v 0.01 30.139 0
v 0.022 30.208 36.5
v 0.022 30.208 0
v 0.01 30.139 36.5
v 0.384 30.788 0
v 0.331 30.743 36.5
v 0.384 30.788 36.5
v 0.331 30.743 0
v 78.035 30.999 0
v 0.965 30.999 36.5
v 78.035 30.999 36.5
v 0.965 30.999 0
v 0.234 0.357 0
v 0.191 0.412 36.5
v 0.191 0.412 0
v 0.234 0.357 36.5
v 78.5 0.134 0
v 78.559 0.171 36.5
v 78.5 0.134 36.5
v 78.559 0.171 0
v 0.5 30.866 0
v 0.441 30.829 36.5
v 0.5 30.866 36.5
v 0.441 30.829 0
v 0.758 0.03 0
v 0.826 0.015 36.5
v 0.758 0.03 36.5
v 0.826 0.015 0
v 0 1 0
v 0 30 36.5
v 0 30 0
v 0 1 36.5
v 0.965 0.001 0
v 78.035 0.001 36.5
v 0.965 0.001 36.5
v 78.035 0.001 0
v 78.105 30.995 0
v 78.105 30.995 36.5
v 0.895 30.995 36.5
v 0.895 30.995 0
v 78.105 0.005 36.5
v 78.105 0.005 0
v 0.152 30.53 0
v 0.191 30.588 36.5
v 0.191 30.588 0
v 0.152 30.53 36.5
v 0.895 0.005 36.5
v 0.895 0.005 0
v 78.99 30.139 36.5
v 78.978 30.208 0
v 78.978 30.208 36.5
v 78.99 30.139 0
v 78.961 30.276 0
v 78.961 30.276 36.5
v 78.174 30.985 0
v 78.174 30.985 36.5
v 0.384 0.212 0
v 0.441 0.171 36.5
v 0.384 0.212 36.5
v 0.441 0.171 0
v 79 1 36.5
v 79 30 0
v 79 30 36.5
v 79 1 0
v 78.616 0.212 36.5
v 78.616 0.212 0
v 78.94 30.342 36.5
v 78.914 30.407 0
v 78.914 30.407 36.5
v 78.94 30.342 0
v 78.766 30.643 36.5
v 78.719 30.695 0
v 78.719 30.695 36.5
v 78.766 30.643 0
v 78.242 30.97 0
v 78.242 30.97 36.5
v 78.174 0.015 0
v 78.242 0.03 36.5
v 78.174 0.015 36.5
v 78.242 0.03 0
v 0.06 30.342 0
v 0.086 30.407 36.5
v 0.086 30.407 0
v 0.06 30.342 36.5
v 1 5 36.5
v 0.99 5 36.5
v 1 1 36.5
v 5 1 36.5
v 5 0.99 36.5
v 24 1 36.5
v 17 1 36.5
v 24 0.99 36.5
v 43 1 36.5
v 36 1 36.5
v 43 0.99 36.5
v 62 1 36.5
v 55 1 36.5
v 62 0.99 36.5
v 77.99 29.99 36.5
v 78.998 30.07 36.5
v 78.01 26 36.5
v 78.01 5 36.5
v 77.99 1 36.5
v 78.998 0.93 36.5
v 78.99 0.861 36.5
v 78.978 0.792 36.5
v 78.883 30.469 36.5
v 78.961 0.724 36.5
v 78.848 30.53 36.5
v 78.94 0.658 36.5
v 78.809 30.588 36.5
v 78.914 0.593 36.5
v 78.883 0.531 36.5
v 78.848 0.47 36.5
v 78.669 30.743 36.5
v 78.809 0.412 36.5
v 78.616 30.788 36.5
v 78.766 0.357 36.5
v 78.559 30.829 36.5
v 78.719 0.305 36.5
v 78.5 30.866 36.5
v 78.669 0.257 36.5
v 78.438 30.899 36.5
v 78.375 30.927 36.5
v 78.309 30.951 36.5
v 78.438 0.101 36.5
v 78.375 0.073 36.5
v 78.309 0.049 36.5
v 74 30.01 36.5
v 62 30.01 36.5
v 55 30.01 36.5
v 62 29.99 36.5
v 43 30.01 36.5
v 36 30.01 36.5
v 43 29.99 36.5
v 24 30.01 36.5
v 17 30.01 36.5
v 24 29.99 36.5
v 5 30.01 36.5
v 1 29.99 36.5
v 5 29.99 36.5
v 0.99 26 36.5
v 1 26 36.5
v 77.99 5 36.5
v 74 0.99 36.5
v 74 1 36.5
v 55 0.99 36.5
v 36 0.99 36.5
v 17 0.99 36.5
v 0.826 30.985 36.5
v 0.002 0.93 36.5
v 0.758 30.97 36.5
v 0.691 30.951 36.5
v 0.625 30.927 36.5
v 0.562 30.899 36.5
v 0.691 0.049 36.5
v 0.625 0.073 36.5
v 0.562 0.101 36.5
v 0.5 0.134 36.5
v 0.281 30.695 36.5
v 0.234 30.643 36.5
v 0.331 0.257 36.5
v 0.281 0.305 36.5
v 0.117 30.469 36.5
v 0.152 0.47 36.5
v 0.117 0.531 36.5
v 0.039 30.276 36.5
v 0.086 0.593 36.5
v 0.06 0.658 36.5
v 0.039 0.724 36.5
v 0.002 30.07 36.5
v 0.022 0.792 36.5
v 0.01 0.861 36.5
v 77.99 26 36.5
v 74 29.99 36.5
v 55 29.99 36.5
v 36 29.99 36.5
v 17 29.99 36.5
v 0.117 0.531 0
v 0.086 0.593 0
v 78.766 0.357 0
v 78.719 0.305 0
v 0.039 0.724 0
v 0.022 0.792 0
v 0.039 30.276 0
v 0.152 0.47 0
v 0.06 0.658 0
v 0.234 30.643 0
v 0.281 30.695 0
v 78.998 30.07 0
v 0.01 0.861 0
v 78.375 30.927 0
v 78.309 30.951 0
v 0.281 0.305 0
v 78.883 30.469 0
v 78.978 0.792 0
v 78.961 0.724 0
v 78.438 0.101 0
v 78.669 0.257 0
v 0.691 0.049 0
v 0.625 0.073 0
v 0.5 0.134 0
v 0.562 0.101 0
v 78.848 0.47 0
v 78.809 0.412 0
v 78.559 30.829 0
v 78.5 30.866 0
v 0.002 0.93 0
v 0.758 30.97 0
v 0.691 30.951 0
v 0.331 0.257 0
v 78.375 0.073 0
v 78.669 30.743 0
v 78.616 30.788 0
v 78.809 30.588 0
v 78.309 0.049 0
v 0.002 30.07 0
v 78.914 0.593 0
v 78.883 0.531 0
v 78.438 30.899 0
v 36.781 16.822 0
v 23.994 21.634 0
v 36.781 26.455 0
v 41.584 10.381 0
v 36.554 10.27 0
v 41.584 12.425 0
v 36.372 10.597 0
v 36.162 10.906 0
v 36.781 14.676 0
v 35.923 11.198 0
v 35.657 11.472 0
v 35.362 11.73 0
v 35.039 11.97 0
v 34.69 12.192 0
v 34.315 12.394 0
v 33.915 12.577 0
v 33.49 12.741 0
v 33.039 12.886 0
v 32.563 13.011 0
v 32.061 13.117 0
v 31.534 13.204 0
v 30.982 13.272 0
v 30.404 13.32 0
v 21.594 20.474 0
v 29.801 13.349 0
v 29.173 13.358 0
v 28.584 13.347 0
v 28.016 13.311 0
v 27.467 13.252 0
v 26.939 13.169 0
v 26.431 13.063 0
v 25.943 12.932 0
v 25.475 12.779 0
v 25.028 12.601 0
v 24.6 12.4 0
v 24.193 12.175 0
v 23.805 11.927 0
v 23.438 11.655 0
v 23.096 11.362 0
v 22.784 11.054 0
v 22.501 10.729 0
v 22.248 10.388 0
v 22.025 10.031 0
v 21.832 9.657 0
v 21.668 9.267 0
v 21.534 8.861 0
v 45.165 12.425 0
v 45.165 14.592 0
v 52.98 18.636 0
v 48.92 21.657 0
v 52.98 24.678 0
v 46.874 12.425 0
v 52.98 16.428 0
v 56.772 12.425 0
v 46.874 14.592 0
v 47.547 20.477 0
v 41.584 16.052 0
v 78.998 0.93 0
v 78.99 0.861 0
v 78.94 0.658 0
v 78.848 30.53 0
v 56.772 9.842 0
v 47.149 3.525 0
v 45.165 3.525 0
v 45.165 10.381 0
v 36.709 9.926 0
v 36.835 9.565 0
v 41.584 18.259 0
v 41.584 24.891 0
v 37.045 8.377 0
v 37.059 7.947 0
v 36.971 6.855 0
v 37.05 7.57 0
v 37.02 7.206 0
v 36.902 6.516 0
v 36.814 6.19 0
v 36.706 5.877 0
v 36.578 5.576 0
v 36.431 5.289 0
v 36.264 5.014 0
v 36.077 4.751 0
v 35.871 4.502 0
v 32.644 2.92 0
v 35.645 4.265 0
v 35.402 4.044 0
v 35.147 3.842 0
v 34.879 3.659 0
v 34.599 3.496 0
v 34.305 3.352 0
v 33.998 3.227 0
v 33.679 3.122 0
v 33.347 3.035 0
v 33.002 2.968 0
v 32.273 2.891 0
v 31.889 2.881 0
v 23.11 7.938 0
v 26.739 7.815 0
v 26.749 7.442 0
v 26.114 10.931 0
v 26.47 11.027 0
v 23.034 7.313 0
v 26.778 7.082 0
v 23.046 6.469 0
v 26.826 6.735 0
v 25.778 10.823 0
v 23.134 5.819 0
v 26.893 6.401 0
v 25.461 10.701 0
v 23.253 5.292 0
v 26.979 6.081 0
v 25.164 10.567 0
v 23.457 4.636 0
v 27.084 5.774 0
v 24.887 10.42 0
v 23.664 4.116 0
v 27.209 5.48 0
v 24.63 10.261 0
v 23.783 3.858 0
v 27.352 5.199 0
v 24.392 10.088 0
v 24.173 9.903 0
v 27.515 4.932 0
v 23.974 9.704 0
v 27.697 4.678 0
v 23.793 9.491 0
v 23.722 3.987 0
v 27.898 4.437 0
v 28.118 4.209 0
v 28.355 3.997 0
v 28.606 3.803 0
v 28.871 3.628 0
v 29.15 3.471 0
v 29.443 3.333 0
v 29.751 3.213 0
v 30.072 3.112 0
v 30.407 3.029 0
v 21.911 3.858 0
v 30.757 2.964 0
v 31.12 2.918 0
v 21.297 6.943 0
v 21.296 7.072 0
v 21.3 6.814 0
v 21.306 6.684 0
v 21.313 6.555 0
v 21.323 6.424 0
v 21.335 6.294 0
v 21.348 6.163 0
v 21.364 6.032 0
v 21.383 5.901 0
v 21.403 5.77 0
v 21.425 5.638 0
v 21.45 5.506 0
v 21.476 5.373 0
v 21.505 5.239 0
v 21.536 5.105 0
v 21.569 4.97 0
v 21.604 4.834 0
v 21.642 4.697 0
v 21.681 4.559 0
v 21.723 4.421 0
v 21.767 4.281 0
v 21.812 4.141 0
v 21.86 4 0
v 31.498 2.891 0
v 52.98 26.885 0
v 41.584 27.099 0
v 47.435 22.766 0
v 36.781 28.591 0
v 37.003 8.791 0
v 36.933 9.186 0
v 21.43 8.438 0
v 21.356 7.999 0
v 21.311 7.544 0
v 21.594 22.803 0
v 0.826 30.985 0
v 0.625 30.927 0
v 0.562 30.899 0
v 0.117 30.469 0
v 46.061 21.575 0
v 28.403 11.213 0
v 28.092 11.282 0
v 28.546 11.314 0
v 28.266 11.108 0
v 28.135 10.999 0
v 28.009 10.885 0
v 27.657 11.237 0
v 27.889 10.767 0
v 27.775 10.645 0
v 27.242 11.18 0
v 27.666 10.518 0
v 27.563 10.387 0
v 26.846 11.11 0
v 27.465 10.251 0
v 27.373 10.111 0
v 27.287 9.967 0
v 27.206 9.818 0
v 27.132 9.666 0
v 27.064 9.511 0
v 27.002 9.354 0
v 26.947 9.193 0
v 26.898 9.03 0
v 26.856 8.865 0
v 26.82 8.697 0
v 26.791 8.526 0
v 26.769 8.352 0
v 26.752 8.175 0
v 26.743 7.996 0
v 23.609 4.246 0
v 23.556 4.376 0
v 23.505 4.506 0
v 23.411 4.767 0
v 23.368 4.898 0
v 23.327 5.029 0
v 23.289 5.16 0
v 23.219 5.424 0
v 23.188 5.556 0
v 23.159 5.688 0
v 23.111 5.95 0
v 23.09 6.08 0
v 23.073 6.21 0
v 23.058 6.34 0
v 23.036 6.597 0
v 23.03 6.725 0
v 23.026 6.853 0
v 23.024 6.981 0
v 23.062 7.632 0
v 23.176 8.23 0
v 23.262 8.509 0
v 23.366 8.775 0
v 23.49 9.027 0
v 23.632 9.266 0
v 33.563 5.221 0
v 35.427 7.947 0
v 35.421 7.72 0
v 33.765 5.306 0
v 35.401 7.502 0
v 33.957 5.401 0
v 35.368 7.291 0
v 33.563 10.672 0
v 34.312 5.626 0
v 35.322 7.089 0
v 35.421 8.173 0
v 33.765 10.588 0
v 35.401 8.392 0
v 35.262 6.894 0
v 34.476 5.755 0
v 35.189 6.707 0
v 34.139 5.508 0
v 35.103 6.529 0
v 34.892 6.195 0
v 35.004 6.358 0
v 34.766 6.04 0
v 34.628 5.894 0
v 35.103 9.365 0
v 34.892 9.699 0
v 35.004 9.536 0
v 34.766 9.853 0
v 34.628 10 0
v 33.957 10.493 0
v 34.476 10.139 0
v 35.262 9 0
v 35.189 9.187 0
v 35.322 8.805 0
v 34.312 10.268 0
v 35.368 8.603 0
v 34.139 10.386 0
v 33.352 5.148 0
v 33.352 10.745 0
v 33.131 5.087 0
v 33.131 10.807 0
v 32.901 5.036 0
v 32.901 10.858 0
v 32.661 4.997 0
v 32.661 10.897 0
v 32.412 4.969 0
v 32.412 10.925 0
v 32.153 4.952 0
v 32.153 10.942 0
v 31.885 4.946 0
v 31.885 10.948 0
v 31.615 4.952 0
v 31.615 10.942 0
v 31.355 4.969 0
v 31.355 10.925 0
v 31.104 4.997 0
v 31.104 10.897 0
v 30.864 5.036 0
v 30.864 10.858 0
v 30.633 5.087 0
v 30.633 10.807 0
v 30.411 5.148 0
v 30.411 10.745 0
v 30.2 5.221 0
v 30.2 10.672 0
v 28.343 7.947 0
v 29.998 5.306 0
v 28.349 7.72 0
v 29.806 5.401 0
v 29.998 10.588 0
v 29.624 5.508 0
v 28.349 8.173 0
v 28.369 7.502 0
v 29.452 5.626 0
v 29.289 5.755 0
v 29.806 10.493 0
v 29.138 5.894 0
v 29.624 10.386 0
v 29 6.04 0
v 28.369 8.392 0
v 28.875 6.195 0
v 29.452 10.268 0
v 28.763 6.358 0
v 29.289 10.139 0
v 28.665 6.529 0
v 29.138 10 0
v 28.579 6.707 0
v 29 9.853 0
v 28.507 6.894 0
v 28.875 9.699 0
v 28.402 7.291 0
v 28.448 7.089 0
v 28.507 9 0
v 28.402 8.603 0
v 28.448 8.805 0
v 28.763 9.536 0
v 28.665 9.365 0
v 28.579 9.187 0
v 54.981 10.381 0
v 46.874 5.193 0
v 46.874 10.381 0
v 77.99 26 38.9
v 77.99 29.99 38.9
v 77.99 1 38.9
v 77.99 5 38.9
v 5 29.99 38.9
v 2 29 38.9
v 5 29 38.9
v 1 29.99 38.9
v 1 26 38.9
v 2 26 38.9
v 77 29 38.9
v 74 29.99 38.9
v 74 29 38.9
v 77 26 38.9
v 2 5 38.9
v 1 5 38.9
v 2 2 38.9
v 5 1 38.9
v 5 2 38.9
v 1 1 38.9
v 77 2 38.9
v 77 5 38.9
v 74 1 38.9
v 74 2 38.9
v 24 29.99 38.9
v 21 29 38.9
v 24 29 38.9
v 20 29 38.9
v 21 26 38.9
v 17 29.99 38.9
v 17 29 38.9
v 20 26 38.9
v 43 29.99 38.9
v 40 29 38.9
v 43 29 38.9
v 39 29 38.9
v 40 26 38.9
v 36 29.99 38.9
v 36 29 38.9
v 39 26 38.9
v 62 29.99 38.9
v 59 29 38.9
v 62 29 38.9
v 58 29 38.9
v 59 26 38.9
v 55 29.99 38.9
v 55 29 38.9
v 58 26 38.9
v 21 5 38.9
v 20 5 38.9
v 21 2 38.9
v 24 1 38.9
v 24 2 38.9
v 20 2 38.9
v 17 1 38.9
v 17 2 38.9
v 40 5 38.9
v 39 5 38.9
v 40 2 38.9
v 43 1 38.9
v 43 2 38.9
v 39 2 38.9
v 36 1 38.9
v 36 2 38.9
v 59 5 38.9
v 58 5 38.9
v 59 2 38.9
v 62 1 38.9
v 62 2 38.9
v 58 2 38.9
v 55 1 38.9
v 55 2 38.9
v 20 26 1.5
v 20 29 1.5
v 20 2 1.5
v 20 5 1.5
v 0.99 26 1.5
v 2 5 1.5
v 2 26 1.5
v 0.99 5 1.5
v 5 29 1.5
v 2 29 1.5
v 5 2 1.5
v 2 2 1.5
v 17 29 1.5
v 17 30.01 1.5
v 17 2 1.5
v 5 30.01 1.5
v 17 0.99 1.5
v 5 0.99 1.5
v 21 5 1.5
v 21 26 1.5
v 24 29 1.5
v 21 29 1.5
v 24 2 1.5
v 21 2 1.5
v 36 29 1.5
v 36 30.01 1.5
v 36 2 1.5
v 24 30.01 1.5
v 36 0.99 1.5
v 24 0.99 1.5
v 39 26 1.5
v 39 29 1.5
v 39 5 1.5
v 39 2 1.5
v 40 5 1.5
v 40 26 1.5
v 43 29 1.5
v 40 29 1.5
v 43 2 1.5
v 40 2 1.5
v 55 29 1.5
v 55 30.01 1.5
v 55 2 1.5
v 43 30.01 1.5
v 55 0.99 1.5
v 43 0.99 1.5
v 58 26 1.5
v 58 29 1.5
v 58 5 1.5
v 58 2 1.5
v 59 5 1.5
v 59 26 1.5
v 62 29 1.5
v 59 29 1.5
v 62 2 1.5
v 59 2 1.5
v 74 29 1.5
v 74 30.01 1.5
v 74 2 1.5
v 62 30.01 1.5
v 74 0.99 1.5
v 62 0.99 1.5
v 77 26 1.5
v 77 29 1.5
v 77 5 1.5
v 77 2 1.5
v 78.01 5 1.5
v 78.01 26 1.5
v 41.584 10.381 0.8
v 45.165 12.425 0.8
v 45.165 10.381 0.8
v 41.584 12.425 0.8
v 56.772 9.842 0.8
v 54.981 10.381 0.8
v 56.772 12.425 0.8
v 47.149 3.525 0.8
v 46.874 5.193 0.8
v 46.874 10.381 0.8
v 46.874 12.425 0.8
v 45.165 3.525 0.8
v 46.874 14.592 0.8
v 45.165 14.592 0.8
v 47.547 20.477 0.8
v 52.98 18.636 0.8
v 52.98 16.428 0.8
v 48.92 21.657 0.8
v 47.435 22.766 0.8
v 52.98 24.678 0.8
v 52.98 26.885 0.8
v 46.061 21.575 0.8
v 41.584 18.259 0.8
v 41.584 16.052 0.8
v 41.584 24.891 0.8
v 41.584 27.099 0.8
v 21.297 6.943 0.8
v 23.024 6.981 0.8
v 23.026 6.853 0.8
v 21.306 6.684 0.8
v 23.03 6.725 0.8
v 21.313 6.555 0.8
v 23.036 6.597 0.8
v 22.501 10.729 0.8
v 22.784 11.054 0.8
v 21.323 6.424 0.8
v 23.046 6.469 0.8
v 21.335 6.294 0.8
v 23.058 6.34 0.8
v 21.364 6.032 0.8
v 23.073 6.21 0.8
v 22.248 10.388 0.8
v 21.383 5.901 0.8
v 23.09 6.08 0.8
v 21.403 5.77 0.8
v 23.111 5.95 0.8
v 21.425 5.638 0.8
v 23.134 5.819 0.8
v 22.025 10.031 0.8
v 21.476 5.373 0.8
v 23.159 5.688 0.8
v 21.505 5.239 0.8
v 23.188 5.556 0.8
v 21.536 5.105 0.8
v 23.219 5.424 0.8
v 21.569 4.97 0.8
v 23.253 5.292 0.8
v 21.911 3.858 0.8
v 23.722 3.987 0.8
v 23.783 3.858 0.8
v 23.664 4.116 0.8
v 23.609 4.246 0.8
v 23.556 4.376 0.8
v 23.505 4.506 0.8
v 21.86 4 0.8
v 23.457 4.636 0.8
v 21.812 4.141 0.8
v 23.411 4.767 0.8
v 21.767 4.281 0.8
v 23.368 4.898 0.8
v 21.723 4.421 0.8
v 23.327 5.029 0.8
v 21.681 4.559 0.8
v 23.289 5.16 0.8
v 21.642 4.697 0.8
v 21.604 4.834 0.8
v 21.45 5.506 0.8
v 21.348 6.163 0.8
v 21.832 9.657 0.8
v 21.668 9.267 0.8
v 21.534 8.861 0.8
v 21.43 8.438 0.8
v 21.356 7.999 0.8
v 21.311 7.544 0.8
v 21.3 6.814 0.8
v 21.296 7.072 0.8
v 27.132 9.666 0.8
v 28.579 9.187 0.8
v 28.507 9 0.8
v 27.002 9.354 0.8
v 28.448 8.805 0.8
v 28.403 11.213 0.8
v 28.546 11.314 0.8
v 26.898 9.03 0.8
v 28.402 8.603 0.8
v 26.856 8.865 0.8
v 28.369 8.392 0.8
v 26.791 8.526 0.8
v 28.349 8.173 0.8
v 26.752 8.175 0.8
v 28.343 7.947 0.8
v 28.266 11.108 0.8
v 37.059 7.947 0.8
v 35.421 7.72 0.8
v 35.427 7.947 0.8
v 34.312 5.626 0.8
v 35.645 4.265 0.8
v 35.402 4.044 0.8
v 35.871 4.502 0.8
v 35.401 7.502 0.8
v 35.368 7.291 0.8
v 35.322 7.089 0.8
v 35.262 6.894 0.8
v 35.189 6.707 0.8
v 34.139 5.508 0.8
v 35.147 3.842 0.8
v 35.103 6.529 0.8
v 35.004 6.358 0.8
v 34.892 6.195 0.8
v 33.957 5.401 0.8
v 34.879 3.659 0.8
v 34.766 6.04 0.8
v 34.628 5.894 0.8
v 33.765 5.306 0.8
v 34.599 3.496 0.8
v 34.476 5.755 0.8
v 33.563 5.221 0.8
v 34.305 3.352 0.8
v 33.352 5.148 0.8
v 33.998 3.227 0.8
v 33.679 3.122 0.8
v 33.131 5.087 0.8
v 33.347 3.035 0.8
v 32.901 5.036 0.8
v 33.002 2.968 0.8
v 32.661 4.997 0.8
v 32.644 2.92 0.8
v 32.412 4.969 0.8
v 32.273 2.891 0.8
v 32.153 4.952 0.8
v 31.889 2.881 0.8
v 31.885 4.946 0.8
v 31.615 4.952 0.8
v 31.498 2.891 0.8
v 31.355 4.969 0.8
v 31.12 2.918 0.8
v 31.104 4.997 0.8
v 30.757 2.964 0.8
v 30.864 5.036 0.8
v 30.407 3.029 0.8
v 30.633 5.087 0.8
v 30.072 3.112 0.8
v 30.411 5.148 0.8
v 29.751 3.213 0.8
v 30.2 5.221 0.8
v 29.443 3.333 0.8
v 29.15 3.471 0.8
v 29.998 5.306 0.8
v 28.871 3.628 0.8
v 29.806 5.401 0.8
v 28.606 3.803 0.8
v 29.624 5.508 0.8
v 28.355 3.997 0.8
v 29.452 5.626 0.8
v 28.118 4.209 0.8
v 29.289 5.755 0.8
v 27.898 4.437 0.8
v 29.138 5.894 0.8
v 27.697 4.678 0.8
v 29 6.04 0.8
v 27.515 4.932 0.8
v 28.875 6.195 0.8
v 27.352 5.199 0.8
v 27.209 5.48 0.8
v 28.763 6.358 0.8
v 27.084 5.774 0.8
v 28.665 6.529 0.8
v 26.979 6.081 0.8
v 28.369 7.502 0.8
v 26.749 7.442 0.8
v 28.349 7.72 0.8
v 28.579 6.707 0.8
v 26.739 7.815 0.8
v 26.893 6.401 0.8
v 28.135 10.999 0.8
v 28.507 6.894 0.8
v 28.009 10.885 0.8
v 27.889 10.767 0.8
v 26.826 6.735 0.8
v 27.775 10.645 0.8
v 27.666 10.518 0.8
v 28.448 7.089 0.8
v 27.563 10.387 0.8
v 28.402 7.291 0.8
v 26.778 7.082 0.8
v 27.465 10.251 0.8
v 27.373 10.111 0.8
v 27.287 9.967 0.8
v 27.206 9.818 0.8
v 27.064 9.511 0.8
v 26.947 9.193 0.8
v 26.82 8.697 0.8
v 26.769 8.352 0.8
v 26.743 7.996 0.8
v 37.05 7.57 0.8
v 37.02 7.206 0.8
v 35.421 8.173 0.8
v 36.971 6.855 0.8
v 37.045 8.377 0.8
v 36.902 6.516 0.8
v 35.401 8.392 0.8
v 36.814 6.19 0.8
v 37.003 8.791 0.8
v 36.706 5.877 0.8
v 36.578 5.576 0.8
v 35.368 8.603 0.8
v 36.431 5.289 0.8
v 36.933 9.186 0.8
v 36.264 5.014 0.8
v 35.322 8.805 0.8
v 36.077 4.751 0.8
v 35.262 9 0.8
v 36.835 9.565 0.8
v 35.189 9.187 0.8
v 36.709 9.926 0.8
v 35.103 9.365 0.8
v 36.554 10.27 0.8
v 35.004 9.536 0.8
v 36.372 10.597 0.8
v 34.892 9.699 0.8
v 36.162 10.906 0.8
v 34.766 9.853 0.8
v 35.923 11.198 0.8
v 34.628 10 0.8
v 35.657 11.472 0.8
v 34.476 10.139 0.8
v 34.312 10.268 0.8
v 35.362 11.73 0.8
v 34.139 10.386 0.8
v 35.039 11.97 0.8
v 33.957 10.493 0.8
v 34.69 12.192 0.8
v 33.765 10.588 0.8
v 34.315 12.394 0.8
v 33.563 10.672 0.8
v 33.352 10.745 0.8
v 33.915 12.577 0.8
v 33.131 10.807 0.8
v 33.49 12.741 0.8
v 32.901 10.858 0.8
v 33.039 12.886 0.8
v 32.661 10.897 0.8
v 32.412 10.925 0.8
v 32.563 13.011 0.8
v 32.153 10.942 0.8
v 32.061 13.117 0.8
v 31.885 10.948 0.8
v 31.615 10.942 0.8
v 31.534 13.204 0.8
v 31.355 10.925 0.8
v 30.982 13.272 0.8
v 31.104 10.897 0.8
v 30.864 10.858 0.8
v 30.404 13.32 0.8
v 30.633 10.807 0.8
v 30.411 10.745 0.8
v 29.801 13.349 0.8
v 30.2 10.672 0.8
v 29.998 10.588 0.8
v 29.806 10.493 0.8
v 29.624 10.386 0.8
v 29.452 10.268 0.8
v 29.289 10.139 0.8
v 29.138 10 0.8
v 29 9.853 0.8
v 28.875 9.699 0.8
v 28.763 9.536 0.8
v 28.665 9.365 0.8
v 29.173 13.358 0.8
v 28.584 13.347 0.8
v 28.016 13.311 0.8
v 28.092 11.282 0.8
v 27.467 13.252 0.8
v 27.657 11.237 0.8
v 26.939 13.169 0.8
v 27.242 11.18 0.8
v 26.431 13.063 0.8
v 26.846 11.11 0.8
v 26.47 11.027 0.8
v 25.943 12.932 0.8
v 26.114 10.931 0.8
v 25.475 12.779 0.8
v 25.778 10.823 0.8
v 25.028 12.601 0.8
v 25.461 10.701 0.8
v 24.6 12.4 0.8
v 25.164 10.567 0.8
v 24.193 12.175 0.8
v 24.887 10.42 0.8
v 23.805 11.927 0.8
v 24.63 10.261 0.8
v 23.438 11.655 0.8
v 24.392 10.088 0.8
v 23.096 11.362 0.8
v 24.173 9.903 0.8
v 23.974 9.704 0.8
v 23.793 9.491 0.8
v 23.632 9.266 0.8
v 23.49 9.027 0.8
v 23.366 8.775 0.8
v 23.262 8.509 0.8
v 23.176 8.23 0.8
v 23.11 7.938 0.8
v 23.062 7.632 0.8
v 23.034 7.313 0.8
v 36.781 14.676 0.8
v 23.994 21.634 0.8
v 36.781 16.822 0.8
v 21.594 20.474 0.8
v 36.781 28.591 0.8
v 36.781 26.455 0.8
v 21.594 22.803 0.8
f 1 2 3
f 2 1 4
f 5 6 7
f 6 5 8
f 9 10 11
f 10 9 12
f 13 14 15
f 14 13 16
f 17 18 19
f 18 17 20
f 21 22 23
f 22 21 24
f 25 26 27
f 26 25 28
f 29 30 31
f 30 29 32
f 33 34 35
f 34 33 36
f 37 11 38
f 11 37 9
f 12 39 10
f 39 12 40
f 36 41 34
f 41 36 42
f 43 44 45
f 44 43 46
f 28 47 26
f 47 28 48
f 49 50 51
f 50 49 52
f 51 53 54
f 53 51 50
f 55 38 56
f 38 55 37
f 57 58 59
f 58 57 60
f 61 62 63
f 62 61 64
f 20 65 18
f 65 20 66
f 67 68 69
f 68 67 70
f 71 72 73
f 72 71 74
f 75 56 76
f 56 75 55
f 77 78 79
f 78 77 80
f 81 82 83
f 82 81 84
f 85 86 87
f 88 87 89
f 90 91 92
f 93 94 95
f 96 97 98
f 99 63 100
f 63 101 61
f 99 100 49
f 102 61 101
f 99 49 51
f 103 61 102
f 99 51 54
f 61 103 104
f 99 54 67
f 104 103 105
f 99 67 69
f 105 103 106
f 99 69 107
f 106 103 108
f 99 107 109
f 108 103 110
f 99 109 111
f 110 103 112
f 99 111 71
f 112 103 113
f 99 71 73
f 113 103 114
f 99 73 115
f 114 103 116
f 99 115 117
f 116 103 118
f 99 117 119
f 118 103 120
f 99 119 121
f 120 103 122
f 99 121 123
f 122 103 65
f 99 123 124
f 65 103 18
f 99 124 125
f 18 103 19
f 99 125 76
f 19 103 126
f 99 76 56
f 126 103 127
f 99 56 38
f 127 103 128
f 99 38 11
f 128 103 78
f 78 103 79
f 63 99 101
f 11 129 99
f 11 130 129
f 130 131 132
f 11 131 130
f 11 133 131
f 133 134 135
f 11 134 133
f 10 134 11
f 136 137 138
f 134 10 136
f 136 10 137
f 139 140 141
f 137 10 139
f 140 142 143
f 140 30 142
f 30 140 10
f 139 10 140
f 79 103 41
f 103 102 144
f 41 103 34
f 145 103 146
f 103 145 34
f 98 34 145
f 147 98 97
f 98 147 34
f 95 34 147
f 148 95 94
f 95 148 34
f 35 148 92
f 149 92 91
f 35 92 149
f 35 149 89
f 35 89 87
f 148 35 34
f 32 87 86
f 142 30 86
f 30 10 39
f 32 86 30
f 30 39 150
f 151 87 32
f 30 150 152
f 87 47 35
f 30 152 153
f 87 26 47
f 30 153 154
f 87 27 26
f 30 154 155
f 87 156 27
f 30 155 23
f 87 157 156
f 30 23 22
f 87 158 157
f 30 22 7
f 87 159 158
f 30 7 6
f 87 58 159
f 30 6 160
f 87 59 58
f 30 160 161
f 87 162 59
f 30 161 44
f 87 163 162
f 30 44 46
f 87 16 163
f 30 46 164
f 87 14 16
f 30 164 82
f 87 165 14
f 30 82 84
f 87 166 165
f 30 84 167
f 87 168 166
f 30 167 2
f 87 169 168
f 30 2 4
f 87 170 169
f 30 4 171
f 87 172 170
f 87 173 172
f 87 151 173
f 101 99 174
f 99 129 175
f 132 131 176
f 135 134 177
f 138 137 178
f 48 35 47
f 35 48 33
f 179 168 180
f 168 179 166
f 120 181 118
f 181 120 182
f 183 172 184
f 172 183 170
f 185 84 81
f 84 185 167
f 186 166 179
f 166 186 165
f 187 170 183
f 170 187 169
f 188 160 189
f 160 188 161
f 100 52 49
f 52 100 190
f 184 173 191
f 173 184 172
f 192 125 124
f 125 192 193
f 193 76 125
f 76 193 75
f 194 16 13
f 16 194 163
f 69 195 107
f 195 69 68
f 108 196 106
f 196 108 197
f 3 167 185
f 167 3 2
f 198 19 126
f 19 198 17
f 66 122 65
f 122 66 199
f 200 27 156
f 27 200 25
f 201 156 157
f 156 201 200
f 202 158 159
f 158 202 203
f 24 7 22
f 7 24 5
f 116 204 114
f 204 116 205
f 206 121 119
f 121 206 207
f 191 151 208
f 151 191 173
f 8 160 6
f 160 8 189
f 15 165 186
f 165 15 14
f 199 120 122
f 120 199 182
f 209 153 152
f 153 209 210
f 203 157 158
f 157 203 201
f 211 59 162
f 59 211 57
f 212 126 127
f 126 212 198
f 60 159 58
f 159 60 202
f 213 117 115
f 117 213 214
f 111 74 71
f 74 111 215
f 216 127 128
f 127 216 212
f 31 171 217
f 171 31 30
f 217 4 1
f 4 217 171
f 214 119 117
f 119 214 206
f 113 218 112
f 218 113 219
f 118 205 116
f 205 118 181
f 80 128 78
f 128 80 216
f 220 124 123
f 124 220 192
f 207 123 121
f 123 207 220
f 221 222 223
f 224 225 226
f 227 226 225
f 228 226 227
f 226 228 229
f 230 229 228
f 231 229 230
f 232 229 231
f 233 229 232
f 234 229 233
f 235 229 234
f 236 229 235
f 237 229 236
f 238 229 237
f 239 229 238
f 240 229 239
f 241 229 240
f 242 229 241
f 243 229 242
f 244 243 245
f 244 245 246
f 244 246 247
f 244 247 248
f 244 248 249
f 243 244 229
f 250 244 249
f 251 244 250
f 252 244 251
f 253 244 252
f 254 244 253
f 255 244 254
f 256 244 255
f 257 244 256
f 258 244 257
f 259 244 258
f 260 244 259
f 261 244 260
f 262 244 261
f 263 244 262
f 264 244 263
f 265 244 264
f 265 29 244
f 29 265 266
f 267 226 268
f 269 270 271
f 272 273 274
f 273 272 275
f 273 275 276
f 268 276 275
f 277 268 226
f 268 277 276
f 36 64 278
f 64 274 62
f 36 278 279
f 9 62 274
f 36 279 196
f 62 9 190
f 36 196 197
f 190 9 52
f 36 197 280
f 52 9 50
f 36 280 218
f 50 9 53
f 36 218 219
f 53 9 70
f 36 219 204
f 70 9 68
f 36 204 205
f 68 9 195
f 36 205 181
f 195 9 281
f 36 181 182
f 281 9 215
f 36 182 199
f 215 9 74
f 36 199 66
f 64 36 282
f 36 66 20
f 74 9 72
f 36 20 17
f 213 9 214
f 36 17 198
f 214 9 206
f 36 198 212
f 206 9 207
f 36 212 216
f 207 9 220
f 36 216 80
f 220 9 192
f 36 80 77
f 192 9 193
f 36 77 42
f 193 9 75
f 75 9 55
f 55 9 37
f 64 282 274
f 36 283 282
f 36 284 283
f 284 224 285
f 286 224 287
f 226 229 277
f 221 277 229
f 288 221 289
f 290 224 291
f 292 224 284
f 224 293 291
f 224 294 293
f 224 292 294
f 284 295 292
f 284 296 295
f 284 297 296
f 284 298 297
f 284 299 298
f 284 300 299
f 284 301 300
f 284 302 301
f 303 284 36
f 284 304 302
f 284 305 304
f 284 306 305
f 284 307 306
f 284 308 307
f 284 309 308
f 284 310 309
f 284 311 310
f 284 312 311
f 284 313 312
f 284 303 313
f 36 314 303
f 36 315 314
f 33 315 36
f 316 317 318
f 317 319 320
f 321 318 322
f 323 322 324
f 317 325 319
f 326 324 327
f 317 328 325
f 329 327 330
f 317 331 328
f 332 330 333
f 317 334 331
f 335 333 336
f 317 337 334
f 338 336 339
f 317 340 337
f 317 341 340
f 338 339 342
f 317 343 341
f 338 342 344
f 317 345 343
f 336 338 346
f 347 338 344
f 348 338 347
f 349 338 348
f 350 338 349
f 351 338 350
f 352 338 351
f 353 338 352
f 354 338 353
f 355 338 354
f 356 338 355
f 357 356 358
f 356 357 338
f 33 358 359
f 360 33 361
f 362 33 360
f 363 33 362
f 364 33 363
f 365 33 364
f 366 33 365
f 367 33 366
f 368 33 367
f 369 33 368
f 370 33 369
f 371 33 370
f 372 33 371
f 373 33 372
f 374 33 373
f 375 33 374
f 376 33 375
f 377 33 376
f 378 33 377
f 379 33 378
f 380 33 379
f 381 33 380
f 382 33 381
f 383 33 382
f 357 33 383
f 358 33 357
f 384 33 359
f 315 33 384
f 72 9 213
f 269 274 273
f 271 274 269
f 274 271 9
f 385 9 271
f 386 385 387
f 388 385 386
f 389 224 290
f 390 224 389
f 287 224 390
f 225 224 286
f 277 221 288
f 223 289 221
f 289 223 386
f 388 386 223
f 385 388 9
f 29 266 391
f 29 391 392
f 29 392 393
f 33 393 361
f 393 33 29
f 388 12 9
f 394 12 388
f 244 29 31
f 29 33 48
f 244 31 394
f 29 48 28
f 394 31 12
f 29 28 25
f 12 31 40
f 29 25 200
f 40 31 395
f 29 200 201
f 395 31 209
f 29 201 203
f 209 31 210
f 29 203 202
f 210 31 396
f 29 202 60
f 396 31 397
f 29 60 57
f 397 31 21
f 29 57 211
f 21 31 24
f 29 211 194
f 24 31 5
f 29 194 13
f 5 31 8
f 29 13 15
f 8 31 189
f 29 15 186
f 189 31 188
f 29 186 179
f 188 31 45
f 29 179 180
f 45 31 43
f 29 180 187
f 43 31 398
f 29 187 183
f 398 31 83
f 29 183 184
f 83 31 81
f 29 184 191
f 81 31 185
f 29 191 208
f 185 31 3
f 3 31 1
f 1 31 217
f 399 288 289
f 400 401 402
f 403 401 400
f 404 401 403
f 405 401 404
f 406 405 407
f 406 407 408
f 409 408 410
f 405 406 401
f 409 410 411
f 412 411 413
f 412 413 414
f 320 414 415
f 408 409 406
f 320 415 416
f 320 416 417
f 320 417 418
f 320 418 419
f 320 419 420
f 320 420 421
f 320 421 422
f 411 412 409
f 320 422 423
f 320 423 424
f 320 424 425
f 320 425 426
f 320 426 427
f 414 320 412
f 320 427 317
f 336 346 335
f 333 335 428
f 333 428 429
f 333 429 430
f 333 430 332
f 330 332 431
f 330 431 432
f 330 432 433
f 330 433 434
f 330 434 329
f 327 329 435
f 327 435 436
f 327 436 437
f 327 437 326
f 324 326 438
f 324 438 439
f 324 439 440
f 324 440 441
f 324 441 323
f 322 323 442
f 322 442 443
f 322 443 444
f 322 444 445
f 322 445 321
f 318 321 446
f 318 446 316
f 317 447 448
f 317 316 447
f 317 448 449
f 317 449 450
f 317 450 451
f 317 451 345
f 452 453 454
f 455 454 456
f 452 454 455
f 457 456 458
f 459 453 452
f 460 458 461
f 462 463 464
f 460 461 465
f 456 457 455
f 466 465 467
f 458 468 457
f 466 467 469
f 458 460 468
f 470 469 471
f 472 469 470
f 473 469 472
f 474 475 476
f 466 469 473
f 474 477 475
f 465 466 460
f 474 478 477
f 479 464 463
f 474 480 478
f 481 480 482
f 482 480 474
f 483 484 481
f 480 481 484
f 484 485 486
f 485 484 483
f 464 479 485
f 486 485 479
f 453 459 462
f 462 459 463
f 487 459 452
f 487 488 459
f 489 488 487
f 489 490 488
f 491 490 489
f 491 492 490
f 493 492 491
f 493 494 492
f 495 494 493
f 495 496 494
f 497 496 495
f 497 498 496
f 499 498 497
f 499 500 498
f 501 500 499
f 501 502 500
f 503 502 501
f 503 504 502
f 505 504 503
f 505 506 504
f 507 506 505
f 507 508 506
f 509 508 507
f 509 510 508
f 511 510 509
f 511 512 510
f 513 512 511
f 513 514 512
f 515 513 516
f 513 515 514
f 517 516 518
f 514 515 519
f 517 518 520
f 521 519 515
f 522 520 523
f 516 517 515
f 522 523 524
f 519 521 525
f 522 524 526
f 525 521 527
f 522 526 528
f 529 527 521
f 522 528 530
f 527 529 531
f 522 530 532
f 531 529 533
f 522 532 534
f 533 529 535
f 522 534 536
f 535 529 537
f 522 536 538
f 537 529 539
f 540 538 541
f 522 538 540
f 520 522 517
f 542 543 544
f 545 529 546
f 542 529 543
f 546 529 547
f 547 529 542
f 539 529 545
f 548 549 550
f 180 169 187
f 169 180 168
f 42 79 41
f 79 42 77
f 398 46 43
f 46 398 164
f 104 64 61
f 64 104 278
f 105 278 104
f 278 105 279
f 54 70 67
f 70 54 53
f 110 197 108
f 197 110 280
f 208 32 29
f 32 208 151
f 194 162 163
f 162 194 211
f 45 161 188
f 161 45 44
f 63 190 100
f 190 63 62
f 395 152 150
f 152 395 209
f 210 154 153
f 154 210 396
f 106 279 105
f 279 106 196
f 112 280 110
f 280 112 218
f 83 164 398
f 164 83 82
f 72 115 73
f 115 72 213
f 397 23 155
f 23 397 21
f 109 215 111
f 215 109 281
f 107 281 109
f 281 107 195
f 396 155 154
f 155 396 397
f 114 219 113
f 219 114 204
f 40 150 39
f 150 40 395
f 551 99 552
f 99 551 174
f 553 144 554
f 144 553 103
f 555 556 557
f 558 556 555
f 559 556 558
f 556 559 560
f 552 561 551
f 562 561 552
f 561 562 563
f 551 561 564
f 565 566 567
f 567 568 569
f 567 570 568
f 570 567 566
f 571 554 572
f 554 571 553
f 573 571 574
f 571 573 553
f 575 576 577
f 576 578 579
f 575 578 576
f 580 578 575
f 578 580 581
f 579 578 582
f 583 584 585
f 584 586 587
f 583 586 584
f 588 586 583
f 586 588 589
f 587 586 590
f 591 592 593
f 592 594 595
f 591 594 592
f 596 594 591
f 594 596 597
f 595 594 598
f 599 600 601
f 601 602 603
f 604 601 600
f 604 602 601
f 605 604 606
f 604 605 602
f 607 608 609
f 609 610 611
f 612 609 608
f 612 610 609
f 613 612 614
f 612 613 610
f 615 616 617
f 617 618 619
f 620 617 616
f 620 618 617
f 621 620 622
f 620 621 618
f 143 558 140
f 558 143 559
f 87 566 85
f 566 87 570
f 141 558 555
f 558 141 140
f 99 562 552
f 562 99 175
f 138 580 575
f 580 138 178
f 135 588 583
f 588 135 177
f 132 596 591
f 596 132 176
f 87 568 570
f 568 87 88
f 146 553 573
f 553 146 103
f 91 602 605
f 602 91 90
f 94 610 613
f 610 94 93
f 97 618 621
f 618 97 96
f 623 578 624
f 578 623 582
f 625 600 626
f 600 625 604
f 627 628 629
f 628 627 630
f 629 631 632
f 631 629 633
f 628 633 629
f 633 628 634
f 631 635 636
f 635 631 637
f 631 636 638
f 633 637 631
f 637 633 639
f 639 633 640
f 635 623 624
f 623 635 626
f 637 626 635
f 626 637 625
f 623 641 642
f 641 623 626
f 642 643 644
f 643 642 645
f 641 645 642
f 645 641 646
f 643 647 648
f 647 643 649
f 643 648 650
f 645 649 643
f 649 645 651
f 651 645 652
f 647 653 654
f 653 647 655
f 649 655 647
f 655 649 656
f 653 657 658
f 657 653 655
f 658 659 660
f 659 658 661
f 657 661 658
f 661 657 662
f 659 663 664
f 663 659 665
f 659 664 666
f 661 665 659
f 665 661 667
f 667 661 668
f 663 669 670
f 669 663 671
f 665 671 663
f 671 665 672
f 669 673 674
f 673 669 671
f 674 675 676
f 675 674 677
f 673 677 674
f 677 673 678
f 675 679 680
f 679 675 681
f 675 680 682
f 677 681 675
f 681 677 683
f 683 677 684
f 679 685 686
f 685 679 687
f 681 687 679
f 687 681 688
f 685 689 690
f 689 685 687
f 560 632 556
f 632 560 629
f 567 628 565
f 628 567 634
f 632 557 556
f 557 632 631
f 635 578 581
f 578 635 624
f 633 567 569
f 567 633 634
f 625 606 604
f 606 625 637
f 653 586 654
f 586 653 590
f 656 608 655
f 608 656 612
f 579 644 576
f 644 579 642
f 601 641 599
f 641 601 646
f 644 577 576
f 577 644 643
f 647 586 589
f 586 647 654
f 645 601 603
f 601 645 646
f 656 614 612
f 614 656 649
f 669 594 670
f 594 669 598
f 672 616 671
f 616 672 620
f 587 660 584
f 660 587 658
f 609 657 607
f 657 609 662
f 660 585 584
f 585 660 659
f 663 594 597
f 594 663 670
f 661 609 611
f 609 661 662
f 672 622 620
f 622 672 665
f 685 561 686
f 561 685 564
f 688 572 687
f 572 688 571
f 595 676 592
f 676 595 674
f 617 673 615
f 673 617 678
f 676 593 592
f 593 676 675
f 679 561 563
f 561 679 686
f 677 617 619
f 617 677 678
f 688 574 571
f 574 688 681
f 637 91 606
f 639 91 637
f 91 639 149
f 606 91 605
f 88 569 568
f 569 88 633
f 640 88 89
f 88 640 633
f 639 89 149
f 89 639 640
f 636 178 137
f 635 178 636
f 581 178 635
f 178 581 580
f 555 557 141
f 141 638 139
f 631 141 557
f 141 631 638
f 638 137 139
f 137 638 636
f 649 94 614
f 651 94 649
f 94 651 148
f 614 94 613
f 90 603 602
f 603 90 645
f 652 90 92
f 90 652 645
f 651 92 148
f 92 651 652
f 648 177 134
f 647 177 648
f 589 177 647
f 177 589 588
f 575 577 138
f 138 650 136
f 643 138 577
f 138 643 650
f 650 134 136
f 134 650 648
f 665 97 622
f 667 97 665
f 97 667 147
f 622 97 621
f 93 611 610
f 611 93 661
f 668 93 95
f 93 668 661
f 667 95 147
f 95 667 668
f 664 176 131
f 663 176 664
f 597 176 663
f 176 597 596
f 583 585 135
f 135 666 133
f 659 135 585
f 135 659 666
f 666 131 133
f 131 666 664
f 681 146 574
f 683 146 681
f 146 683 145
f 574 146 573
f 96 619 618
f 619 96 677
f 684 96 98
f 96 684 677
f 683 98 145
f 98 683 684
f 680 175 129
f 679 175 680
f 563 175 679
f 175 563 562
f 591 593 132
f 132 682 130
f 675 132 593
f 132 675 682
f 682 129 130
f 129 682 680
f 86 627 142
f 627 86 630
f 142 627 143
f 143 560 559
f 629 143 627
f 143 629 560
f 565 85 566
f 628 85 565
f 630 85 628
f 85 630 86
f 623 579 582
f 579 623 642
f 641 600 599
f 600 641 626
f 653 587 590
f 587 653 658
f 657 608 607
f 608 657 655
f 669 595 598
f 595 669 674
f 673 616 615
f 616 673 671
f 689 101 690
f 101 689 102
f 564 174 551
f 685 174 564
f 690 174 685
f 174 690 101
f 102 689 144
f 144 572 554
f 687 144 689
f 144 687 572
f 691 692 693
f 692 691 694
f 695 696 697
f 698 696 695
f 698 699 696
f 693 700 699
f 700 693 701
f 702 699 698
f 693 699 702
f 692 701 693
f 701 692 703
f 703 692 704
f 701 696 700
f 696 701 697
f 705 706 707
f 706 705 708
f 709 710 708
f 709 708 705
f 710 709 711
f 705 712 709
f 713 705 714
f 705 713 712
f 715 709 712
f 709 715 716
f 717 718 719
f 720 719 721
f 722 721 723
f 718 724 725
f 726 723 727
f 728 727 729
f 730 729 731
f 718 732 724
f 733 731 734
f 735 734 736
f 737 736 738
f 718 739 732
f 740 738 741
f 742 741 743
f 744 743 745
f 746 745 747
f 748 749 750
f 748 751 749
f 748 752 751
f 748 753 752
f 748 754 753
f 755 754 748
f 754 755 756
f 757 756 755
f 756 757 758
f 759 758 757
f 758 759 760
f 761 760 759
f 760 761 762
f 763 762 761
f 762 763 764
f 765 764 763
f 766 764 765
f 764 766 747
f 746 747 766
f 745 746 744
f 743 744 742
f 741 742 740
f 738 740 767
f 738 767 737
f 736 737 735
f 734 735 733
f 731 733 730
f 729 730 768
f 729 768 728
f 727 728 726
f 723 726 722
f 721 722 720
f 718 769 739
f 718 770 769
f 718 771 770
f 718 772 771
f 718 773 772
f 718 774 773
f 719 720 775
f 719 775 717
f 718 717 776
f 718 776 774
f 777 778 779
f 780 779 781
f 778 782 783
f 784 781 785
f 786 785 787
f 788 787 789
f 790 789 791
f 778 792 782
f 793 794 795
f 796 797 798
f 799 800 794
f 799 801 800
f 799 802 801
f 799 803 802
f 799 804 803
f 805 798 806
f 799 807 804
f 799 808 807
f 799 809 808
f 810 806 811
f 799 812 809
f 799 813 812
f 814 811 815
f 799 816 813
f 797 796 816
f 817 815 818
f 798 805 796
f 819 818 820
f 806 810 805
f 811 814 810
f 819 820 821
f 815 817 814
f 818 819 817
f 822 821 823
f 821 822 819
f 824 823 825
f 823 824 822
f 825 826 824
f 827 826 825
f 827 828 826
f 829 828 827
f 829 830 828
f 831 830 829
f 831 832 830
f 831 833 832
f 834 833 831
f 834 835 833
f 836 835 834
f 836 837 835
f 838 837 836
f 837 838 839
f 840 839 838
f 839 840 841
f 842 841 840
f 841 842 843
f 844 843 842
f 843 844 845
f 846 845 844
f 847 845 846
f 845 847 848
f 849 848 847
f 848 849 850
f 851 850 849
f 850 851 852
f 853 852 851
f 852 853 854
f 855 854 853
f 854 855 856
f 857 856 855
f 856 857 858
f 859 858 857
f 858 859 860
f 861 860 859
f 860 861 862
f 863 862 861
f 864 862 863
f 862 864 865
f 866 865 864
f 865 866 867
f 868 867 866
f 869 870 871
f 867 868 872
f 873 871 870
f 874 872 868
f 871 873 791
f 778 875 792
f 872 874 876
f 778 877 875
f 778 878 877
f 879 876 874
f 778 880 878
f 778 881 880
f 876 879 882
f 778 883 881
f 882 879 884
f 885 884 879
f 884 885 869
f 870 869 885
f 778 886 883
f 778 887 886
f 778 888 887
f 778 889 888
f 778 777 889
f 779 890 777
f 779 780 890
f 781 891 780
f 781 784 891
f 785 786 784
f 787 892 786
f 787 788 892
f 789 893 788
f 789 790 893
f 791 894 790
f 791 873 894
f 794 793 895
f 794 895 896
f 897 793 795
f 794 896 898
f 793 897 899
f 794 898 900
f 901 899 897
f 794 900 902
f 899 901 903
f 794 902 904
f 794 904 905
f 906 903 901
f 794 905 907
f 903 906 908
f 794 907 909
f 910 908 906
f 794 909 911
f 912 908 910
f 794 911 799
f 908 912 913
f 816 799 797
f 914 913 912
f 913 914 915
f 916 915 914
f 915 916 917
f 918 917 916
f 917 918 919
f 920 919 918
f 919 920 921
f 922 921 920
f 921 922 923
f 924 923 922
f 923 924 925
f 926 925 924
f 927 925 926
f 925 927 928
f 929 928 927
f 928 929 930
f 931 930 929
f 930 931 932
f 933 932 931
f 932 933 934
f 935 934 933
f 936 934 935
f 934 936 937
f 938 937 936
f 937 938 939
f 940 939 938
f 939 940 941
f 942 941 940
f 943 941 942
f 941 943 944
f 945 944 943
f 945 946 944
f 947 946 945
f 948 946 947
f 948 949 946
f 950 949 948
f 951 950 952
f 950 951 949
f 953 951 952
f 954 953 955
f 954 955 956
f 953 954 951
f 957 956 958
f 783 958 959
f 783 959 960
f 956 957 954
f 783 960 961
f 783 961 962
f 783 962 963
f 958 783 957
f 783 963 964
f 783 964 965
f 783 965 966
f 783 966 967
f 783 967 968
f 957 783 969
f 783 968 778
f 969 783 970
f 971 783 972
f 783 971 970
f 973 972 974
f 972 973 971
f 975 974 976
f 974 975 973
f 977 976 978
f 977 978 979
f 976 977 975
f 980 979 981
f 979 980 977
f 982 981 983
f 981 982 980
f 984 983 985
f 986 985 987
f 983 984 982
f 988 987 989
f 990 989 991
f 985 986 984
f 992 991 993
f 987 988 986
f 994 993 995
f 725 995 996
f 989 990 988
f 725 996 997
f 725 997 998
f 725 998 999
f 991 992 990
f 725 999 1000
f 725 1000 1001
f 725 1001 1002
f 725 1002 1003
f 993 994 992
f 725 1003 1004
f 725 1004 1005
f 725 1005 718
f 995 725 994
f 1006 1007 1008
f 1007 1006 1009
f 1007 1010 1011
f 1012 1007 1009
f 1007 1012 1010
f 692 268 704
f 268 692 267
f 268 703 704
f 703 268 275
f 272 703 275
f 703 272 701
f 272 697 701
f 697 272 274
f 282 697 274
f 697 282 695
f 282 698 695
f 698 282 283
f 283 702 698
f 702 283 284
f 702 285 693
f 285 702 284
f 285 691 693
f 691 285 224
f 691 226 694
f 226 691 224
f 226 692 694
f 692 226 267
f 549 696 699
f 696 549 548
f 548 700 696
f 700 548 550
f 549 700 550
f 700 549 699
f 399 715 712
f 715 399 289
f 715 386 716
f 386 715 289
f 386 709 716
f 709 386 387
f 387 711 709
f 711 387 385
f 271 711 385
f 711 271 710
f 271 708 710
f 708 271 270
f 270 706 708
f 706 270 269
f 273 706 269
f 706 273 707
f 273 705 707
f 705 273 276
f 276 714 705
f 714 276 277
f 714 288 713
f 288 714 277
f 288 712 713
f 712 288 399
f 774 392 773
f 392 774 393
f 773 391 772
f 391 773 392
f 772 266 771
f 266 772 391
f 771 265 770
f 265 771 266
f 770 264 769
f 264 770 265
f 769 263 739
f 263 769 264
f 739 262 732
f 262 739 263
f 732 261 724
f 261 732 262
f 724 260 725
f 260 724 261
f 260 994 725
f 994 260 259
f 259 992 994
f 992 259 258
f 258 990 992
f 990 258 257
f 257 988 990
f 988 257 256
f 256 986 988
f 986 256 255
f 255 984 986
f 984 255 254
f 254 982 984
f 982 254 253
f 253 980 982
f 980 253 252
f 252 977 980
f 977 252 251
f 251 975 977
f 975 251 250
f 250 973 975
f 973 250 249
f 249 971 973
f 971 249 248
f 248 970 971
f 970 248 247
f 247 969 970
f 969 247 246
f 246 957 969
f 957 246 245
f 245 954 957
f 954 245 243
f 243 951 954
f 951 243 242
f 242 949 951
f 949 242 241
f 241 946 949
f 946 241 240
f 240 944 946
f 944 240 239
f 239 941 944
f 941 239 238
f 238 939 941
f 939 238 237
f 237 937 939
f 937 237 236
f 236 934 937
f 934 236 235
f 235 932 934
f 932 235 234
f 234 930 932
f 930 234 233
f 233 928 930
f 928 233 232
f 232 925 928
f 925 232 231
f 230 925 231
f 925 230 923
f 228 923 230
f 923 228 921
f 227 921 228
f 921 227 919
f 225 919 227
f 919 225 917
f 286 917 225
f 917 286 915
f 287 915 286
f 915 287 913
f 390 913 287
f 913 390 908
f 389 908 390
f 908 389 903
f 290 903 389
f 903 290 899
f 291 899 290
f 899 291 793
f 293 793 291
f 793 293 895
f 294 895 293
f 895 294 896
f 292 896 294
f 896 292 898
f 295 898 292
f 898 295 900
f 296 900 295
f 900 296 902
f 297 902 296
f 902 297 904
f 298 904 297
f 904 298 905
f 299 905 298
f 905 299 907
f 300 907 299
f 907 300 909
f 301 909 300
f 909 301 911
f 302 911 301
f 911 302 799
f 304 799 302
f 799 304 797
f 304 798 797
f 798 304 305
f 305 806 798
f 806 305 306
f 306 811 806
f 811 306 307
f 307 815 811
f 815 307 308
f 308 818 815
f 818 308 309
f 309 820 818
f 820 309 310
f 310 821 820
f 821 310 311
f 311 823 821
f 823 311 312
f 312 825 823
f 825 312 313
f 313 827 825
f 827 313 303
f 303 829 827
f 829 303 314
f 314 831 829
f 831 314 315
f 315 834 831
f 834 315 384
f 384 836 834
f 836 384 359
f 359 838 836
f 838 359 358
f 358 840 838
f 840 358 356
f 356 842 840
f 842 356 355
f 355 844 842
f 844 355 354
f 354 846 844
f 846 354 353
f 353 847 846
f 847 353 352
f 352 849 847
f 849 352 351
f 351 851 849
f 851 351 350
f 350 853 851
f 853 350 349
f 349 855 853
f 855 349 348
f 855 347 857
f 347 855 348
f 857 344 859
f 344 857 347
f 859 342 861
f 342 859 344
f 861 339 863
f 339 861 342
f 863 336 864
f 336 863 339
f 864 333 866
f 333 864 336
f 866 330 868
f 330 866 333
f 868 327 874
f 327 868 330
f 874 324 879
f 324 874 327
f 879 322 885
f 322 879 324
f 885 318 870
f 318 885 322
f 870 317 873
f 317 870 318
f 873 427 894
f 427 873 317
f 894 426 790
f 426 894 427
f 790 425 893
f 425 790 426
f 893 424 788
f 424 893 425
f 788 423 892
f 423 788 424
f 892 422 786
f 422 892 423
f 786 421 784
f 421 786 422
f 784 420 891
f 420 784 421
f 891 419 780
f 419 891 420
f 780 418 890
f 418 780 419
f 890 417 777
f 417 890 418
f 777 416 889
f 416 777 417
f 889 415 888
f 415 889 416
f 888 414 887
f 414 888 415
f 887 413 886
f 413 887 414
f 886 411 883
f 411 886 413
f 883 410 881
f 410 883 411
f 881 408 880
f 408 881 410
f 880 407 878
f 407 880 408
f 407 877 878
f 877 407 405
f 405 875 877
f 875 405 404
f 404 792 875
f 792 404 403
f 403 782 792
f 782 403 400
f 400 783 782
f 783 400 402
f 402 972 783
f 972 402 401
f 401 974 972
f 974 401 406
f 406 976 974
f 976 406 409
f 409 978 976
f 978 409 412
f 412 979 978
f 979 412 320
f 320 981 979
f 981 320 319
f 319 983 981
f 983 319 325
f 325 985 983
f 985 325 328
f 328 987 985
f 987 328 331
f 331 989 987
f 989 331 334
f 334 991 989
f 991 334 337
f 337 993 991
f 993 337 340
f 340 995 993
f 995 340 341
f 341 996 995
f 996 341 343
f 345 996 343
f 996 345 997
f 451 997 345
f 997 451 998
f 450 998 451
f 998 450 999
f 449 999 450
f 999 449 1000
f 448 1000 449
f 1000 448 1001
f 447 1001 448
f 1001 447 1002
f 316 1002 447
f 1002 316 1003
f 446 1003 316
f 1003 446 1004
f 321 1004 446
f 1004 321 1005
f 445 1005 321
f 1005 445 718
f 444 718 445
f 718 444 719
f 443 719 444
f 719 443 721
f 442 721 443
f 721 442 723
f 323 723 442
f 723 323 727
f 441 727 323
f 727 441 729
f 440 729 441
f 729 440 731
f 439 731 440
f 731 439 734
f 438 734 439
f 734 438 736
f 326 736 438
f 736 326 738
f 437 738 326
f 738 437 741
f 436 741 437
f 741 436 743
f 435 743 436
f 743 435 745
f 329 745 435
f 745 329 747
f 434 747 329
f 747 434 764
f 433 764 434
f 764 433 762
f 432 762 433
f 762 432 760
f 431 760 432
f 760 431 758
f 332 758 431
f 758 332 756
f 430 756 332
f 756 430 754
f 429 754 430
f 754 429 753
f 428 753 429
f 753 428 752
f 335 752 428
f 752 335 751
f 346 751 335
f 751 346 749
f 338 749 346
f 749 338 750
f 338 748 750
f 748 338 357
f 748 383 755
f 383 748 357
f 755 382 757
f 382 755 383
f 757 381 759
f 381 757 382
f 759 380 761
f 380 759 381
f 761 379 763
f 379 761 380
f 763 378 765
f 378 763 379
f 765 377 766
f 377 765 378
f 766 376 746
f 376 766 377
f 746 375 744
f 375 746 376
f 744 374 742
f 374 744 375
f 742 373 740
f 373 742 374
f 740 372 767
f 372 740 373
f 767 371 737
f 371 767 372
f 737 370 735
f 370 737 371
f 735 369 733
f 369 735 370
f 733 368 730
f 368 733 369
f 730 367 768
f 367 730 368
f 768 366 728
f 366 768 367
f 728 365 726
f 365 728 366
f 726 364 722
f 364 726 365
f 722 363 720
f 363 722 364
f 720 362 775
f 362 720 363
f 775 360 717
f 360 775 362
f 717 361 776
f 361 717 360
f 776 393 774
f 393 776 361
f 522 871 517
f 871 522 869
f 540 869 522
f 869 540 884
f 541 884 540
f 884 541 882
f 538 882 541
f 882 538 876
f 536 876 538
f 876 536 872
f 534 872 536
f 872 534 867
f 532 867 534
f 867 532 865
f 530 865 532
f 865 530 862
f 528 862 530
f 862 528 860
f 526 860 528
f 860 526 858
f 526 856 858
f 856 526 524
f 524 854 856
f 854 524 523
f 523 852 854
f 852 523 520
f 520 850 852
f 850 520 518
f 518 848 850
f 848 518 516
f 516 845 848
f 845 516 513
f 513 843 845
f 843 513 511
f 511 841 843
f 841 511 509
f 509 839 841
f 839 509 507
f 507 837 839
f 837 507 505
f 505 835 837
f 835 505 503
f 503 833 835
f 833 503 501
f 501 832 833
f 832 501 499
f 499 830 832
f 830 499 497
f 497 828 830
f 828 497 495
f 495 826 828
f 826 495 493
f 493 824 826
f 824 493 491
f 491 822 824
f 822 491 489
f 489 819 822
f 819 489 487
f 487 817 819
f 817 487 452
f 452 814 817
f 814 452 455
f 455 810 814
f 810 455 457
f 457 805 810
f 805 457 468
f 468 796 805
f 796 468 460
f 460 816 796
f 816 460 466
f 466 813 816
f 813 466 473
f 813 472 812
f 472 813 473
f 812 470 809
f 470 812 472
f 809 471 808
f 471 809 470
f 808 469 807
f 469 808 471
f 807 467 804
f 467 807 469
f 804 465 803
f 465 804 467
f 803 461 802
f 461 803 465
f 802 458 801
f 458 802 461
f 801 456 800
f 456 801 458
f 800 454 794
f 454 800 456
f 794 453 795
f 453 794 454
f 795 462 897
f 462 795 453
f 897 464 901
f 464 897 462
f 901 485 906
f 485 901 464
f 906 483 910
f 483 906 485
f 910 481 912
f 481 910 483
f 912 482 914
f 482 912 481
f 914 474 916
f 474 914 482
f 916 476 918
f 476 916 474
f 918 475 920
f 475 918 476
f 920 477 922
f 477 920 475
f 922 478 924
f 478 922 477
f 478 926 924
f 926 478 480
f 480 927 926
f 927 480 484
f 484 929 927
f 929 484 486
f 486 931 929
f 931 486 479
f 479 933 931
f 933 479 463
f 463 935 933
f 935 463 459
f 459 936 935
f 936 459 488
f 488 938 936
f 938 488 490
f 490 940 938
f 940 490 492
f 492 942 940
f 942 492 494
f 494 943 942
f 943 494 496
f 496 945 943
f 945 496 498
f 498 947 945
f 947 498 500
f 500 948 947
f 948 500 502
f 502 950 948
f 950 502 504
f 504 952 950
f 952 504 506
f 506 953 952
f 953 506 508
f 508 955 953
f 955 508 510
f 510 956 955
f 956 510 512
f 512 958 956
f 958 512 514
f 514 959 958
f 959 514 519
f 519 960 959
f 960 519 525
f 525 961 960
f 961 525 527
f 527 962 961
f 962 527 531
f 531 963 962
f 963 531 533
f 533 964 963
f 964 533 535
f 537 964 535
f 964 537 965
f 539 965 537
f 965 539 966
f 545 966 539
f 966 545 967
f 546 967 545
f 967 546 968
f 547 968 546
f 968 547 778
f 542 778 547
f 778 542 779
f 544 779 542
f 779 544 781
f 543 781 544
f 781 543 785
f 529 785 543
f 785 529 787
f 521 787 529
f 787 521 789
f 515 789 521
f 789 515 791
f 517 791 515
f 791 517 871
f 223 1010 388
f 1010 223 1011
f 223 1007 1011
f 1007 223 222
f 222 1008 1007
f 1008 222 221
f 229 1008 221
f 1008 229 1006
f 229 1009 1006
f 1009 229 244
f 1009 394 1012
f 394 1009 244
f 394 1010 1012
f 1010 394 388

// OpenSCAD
// part type, you will need a top and bottom piece
_part = "bottom"; //[top, bottom]

// 6(L)R61	PP3	RC22	47,5 mm × 25,5 mm × 16,5 mm
// Length 26 : battery fit too tight
// Width 17 : battery fit too tight
_batteryLength = 27;
_batteryWidth = 18;

// height of the battery recess (height of top and bottom piece should be equal to or slightly larger than the battery height)
// used 35 for bottom
// and 13 for top : OK
_insideHeight = 35;

// number of batteries across
_columns = 4; // [1:50]

// number of batteries deep
_rows = 1; // [1:50]

// thickness of the inside walls
_walls = 1;

// thickness of the bottom layer
_base = 1.5;

// height of the lip where the parts overlap, increase the value for a more secure fit
_lipHeight = 2.5;

// gap between the top and bottom pieces, decrease the value for a tighter fit.
_fitGap = 0.1;



// depth of the label (negative values to emboss, positive values to extrude)
_labelDepth = -0.8;


///////////////////////////////////////////////////////////////////////////

/*Text Varibles*/
font = "Impact";
letter_size = 15;
letter_height = 2.5;
letter_line_space = 5;
letter_text_line1 = "4x";
letter_text_line2 = "9V";

y=-10;
x=0;





module multiLine(letter_size, letter_line_space){
  union(){
    for (i = [0 : $children-1])
      translate([0 , -i * (letter_size+letter_line_space), 0 ]) children(i);
  }
}

module drawtext(letter_text_line1, letter_text_line2,x,y,_labelDepth, letter_height, font, letter_size, letter_line_space) { 
    rotate(a=180, v=[0,1,0])
      translate([y,x,_labelDepth])
        linear_extrude(height = 3){
            rotate([0,0,90]) translate([0,0,5]) 
            
            multiLine(letter_size, letter_line_space) {
                text(letter_text_line1, font=font, valign="center", halign="center", size=letter_size);
                text(letter_text_line2, font=font, valign="center", halign="center", size=letter_size);
            }
        }
}

module cylinderAt(r, h, x, y, z) {
	translate([x,y,z]) {
		cylinder(r=r, h=h, center=true);
	}
}

module cubeAt(xyh, x, y) {
	translate([x,y,0]) {
		cube(xyh);
	}
}

module roundRectAt(width, depth, height, rounding, x, y) {
    translate([x,y,0]) {
        roundRect(width, depth, height, rounding);
    }
}
module roundRect(width, depth, height, rounding) {
    translate([rounding,rounding,0])
	minkowski()
	{
        cube([width-rounding, depth-rounding, height-1]);
		cylinder(r=rounding, h=1);
	}
}

module batteryGrid(width, length, height, wall, rows, columns) {

	eps = 0.01;
    wallmultip = 3;

	union() {
        // cylinder
        for (x=[0:1:columns-1]) {
            for (y=[0:1:rows-1]) {
                cubeAt([width, length, height], (x*(width+wall)), (y*(length+wall)));
            }
        }
        for (x=[0:1:columns-1]) {
            for (y=[0:1:rows]) {
                cubeAt([width-(2*wallmultip*wall), wall+2*eps, height], (x*(width+wall))+(wallmultip*wall), (y*(length+wall))-wall-eps);
            }
        }
        for (x=[0:1:columns]) {
            for (y=[0:1:rows-1]) {
                cubeAt([wall+2*eps, length-(2*wallmultip*wall), height], (x*(width+wall))-wall-eps, (y*(length+wall))+(wallmultip*wall));
            }
        }


	}
}

module makeTray(bwidth, blength, height, rows, columns, wall, base, lipHeight, fitGap, label, lfont, ldepth, lheight, letter_height, x, y, letter_line_space) {
    eps = 0.01;
    gridHeight = (lipHeight > 0) ? height + lipHeight - fitGap : height;
    rounding = 1;
    width = (bwidth+wall) * columns + wall;
    depth = (blength+wall) * rows + wall;
    widthwall = width + wall;
    depthwall = depth + wall;
    difference() {
        union() {
            difference() {
                roundRect(widthwall, depthwall, height+base, rounding);
				if (lipHeight < 0) {
                    echo (lipHeight);
                    translate([rounding/2+wall/2-fitGap/2, rounding/2+wall/2-fitGap/2,height+base+lipHeight])
					cube([width+fitGap,depth+fitGap,-lipHeight+eps]);
				}
            }
            cubeAt([width-eps,depth-eps,height+base+lipHeight-fitGap], rounding/2+wall/2, rounding/2+wall/2);
        }
        translate([wall+rounding/2+wall/2,wall+rounding/2+wall/2,base]) batteryGrid(bwidth, blength, gridHeight+eps, wall, rows, columns);

    
        if (ldepth < 0) {
            translate([widthwall/2,depthwall/2,0]) addLabel(label, (-ldepth+eps)/2 - eps, ldepth, lheight, lfont, letter_height, x, y, letter_line_space);
        }
		
		if (ldepth > 0) {
			translate([widthwall/2,depthwall/2,0]) addLabel(label, -(ldepth+eps)/2 + eps, ldepth, lheight, lfont, letter_height, x, y, letter_line_space);
        }
    }
}

module addLabel(label, zoffset, depth, height, font, letter_height, x, y, letter_line_space) {
    if (len(label)>0) {
		if (label[0] != "") {
			drawtext(label[0], label[1], x, y, depth, zoffset, font, height, letter_line_space);
		}
	}
}


module make($fn=90) {

	if (_part == "top") {
		makeTray(_batteryWidth, _batteryLength, _insideHeight, _rows, _columns, _walls, _base, -_lipHeight, _fitGap,
					[letter_text_line1, letter_text_line2], font, _labelDepth, letter_size, letter_height, x, y, letter_line_space);
	} else {
		makeTray(_batteryWidth, _batteryLength, _insideHeight, _rows, _columns, _walls, _base, _lipHeight, _fitGap,
					[letter_text_line1, letter_text_line2], font, _labelDepth, letter_size, letter_height, x, y, letter_line_space);
	}
}


make();
